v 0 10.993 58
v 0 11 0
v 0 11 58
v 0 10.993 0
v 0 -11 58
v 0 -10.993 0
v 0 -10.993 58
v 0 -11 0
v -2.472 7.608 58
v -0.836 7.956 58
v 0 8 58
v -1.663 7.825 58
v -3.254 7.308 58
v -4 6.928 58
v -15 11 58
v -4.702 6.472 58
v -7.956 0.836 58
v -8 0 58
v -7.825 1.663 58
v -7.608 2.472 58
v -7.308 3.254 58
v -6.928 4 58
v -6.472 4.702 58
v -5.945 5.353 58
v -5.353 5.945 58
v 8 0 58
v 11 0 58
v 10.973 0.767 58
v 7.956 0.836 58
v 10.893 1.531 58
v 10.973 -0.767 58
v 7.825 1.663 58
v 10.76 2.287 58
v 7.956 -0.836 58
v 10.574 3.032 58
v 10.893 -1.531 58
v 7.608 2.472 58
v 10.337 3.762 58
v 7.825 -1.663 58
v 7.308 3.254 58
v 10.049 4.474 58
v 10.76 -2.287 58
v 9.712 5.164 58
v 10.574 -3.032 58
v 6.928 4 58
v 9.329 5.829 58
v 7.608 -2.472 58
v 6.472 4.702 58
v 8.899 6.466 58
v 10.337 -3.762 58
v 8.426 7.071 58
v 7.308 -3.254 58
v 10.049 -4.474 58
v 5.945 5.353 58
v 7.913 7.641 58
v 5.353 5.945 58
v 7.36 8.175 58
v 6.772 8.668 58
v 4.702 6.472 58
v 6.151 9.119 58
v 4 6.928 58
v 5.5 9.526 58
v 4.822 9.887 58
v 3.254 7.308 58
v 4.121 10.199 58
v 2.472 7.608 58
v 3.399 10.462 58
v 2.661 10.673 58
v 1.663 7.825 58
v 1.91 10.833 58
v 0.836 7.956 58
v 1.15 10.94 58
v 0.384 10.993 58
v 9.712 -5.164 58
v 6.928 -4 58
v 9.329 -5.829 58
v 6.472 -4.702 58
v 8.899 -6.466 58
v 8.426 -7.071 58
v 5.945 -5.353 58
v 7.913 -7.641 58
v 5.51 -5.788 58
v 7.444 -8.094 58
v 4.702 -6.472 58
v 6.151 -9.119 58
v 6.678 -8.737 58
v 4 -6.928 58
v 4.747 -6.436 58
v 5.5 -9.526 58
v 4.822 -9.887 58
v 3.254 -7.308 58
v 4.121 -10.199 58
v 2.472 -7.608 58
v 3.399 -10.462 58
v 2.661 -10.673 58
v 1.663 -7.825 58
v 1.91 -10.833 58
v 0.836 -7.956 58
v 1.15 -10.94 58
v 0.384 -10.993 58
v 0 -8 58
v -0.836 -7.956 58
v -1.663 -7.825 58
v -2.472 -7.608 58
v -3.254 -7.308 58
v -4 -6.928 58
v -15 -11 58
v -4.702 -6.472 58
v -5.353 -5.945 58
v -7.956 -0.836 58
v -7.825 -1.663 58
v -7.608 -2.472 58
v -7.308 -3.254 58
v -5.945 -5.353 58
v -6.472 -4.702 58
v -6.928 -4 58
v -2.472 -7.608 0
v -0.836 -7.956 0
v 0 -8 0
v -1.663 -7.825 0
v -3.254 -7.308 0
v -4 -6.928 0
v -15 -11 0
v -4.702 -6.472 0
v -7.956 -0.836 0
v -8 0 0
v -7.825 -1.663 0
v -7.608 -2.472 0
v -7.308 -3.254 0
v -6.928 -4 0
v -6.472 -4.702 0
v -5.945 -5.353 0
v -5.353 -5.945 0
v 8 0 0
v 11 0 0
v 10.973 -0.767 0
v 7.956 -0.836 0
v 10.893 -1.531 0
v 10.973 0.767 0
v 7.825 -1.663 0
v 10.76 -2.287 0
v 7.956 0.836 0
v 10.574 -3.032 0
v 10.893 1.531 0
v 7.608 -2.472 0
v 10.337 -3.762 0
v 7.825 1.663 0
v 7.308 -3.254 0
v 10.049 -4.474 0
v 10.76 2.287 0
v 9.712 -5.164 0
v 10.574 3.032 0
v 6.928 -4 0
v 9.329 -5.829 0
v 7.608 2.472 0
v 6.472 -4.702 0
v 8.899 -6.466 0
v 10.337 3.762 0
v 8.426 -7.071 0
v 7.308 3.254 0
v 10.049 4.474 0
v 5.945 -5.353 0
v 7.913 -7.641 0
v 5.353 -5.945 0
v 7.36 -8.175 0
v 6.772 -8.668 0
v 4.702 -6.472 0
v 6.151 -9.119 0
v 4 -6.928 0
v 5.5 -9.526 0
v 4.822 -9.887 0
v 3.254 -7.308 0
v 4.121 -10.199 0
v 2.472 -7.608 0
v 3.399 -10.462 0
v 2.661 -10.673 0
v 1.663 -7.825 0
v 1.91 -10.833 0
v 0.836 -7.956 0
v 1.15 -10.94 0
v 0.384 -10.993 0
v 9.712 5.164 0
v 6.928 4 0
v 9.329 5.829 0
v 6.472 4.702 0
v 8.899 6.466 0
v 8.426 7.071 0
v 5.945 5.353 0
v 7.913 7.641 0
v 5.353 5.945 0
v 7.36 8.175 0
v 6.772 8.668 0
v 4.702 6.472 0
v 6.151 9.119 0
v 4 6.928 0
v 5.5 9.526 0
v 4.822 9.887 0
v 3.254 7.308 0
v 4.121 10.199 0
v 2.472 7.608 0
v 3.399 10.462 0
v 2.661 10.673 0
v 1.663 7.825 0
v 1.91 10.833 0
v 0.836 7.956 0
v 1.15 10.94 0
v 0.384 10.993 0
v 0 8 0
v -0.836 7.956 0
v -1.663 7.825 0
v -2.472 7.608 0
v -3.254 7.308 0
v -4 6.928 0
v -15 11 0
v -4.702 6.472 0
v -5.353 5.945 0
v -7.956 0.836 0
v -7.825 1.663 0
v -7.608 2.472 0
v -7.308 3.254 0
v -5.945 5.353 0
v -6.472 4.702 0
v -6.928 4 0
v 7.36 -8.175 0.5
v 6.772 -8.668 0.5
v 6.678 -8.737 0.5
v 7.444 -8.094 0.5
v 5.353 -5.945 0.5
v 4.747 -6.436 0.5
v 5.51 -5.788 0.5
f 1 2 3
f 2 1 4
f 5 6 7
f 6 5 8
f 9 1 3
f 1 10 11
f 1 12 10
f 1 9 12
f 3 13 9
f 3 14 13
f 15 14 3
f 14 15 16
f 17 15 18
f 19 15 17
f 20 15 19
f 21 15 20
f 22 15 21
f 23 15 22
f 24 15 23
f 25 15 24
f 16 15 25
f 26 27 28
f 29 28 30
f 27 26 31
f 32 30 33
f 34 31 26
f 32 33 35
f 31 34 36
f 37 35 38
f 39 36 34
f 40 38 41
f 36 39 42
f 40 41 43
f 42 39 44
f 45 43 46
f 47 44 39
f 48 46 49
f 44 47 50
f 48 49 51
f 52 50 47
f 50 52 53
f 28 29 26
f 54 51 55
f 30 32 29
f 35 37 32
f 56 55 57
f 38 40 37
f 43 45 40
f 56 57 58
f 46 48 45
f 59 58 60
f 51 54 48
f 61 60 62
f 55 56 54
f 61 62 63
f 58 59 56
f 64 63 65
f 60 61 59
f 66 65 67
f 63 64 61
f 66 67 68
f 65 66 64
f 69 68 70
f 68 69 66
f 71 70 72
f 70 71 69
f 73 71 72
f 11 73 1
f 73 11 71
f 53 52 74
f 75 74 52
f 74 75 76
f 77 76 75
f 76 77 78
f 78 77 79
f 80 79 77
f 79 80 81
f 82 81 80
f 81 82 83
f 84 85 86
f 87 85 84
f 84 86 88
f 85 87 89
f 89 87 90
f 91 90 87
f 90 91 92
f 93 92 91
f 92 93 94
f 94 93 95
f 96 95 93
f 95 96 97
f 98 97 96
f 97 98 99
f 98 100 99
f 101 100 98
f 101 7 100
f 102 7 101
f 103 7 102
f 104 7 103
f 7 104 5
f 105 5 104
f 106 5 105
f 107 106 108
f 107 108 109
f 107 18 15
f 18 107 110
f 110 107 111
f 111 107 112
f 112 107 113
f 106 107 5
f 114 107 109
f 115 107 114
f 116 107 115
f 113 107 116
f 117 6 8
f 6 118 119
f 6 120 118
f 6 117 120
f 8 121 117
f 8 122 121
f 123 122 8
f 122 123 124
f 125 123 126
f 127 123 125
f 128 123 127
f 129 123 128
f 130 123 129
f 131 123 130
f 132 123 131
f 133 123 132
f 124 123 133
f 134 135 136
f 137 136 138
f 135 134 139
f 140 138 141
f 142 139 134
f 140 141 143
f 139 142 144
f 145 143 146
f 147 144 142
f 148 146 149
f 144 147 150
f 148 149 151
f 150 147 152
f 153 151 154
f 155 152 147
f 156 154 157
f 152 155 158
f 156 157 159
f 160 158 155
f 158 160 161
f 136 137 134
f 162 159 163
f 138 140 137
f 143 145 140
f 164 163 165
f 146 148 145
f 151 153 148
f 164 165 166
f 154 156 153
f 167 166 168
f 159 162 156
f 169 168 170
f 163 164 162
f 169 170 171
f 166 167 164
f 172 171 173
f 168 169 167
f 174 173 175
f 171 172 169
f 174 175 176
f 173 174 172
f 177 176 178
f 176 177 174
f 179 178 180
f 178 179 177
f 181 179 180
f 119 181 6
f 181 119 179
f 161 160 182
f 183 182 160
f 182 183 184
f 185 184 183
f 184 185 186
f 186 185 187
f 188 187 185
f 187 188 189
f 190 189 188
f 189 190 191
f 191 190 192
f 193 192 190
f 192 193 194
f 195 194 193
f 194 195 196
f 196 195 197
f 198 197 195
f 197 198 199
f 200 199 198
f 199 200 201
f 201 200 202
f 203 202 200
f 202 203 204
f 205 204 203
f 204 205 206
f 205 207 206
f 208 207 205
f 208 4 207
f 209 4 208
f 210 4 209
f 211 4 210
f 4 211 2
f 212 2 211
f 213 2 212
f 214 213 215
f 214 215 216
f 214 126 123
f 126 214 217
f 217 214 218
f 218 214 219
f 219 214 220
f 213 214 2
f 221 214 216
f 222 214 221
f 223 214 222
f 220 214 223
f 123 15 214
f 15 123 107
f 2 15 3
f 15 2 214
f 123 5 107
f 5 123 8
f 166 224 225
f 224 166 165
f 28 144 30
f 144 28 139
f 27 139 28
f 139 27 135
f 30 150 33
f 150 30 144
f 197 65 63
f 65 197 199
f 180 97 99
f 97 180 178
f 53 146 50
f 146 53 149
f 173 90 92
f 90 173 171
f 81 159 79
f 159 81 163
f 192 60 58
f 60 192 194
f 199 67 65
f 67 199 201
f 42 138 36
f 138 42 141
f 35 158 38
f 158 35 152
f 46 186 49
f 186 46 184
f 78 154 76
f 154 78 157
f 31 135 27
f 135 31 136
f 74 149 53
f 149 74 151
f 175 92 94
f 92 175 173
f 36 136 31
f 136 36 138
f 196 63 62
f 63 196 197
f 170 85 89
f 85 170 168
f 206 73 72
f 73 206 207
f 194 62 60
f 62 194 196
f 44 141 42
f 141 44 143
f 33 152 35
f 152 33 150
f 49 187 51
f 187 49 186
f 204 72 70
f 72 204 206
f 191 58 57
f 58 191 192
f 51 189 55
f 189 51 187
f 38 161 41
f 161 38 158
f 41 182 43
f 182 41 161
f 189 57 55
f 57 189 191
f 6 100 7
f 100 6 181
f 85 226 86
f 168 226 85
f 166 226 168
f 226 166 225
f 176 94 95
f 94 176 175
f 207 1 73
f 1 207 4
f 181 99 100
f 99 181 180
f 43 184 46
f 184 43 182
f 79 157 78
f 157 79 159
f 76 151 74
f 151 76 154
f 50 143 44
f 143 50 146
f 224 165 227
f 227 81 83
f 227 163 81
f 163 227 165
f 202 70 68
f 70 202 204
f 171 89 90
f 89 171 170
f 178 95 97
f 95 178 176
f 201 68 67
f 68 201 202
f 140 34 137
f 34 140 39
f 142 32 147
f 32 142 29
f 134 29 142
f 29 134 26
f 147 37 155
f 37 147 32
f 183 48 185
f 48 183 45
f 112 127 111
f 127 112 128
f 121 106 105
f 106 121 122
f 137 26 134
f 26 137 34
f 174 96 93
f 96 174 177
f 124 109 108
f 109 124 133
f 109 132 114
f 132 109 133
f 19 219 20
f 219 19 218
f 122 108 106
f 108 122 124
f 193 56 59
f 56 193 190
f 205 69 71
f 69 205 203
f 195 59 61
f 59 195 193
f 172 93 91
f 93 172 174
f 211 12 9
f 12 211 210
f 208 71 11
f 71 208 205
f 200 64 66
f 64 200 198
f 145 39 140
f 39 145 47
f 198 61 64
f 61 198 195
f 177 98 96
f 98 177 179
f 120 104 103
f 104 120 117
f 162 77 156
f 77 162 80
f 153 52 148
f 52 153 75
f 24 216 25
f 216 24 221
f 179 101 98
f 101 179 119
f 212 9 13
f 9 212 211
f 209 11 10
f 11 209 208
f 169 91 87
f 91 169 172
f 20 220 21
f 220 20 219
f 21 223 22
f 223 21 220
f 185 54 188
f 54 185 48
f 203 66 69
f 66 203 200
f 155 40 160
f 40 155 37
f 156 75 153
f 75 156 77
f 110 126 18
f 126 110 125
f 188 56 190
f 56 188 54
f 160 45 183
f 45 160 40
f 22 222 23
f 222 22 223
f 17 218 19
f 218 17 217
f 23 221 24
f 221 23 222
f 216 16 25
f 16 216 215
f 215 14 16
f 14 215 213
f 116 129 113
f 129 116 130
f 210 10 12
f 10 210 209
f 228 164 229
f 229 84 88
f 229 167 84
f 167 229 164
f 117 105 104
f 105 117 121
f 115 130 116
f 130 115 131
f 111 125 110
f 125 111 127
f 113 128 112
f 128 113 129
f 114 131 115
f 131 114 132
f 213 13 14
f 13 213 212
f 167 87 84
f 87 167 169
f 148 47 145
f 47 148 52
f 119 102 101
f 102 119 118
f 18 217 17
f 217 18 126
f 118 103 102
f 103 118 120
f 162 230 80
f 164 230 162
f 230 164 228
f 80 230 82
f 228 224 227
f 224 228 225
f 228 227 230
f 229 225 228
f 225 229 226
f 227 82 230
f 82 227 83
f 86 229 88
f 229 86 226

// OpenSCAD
// PRUSA iteration3
// Bearing holders
// GNU GPL v3
// Josef Průša <iam@josefprusa.cz> and contributors
// http://www.reprap.org/wiki/Prusa_Mendel
// http://prusamendel.org

bearing_diameter = 16;

module horizontal_bearing_base(bearings=1){
 translate(v=[0,0,6]) cube(size = [24,8+bearings*25,12], center = true);	
}
module horizontal_bearing_holes(bearings=1){
 cutter_lenght = 10+bearings*25;
 one_holder_lenght = 8+25;
 holder_lenght = 8+bearings*25;
 
 // Main bearing cut
 difference(){
  translate(v=[0,0,12]) rotate(a=[90,0,0]) translate(v=[0,0,-cutter_lenght/2]) cylinder(h = cutter_lenght, r=bearing_diameter/2, $fn=50);
  // Bearing retainers
  translate(v=[0,1-holder_lenght/2,3]) cube(size = [24,6,8], center = true);
  translate(v=[0,-1+holder_lenght/2,3]) cube(size = [24,6,8], center = true);
 }
 
 // Ziptie cutouts
 ziptie_cut_ofset = 0;
 for ( i = [0 : bearings-1] ){
  // For easier positioning I move them by half of one 
  // bearing holder then add each bearign lenght and then center again
  translate(v=[0,-holder_lenght/2,0]) translate(v=[0,one_holder_lenght/2+i*25,0]) difference(){
   union(){
    translate(v=[0,2-6,12]) rotate(a=[90,0,0]) translate(v=[0,0,0]) cylinder(h = 4, r=12.5, $fn=50);
    translate(v=[0,2+6,12]) rotate(a=[90,0,0]) translate(v=[0,0,0]) cylinder(h = 4, r=12.5, $fn=50);
   }
   translate(v=[0,10,12]) rotate(a=[90,0,0]) translate(v=[0,0,0]) cylinder(h = 24, r=10, $fn=50);
  }
 }
 
}

module horizontal_bearing_test(){
 difference(){
  horizontal_bearing_base(1);
  horizontal_bearing_holes(1);
 }
 translate(v=[30,0,0]) difference(){
  horizontal_bearing_base(2);
  horizontal_bearing_holes(2);
 }
 translate(v=[60,0,0]) difference(){
  horizontal_bearing_base(3);
  horizontal_bearing_holes(3);
 }
}



thinwall = 3;
bearing_size = bearing_diameter + 2 * thinwall;

module vertical_bearing_base(){
 translate(v=[-2-bearing_size/4,0,29]) cube(size = [4+bearing_size/2,bearing_size,58], center = true);
 cylinder(h = 58, r=bearing_size/2, $fn = 90);
}

module vertical_bearing_holes(){
  translate(v=[0,0,-1]) cylinder(h = 62, r=bearing_diameter/2, $fn = 60);
  rotate(a=[0,0,-50]) translate(v=[8,0,31.5]) cube(size = [7,1,62], center = true);
}

difference(){
vertical_bearing_base();
vertical_bearing_holes();
}
